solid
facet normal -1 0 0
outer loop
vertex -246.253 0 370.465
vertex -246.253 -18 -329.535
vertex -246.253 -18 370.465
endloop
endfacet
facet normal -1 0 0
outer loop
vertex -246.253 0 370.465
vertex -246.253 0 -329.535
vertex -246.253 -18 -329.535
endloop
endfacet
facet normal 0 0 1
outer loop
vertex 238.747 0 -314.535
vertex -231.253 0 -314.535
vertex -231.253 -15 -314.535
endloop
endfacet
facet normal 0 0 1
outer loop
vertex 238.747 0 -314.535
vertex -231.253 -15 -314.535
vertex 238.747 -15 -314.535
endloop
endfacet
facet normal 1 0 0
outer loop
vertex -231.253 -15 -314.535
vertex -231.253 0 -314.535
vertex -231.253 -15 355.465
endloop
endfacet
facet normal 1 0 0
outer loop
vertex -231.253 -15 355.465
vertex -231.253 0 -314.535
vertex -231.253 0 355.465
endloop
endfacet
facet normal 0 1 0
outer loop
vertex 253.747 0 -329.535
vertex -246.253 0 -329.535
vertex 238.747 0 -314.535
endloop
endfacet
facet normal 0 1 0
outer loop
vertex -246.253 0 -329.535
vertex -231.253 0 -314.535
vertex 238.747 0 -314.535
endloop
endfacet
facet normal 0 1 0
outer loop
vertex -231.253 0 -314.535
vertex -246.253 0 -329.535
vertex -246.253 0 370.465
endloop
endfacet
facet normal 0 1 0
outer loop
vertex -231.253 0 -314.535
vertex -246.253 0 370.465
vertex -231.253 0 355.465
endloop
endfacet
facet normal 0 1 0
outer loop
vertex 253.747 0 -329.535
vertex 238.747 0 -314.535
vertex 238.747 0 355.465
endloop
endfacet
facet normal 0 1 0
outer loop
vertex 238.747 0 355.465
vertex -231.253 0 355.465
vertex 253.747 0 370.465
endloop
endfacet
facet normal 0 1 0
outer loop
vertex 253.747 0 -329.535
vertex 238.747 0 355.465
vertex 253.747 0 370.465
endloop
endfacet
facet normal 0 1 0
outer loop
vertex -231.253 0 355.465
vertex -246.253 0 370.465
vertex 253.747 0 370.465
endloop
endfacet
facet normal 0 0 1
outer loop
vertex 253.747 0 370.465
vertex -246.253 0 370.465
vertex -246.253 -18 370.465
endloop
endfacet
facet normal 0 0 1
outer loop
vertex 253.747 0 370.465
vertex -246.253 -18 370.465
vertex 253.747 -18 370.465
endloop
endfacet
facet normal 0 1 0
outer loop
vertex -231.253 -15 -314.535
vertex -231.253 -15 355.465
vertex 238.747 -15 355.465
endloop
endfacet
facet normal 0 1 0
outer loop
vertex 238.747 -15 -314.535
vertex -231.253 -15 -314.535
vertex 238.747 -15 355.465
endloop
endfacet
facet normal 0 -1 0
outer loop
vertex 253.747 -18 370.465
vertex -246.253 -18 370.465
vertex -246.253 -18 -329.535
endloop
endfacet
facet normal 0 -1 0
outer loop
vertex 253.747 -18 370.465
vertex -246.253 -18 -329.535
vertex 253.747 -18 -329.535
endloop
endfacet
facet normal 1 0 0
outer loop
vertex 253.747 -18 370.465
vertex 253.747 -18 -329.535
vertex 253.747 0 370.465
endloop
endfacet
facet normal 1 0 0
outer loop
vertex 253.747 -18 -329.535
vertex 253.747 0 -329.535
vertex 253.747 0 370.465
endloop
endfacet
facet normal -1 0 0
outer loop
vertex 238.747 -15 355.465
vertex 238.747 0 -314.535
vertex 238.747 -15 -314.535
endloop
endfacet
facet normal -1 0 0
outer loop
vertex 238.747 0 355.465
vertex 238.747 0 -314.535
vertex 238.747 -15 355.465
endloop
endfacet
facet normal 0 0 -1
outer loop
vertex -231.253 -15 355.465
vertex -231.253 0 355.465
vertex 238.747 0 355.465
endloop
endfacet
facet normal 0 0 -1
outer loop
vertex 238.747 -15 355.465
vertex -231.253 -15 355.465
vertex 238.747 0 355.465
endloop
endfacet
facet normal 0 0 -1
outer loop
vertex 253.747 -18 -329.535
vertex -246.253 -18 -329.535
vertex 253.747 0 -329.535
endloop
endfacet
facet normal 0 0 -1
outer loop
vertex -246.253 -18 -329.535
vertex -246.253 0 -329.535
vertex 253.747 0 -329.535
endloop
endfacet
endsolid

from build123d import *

# Parameters (mm, degrees)
F0_W     = 500
F0_H     = 700
F0_W_2   = 470
F0_H_2   = 670
F1_DEPTH = 15
F2_W     = 500
F2_H     = 700
F3_DEPTH = 3


with BuildPart() as f1:
    # F0 (on Front) → F1 (new body)
    with BuildSketch(Plane.XZ):
        with Locations((3.746569, 20.465286)):
            Rectangle(F0_W, F0_H)
        with Locations((3.746569, 20.465286)):
            Rectangle(F0_W_2, F0_H_2, mode=Mode.SUBTRACT)
    extrude(amount=F1_DEPTH)

    # F2 (on face) → F3 (join)
    with BuildSketch(Plane.XZ.offset(15)):
        with Locations((3.746569, 20.465286)):
            Rectangle(F2_W, F2_H)
    extrude(amount=F3_DEPTH)


solid = f1.part
